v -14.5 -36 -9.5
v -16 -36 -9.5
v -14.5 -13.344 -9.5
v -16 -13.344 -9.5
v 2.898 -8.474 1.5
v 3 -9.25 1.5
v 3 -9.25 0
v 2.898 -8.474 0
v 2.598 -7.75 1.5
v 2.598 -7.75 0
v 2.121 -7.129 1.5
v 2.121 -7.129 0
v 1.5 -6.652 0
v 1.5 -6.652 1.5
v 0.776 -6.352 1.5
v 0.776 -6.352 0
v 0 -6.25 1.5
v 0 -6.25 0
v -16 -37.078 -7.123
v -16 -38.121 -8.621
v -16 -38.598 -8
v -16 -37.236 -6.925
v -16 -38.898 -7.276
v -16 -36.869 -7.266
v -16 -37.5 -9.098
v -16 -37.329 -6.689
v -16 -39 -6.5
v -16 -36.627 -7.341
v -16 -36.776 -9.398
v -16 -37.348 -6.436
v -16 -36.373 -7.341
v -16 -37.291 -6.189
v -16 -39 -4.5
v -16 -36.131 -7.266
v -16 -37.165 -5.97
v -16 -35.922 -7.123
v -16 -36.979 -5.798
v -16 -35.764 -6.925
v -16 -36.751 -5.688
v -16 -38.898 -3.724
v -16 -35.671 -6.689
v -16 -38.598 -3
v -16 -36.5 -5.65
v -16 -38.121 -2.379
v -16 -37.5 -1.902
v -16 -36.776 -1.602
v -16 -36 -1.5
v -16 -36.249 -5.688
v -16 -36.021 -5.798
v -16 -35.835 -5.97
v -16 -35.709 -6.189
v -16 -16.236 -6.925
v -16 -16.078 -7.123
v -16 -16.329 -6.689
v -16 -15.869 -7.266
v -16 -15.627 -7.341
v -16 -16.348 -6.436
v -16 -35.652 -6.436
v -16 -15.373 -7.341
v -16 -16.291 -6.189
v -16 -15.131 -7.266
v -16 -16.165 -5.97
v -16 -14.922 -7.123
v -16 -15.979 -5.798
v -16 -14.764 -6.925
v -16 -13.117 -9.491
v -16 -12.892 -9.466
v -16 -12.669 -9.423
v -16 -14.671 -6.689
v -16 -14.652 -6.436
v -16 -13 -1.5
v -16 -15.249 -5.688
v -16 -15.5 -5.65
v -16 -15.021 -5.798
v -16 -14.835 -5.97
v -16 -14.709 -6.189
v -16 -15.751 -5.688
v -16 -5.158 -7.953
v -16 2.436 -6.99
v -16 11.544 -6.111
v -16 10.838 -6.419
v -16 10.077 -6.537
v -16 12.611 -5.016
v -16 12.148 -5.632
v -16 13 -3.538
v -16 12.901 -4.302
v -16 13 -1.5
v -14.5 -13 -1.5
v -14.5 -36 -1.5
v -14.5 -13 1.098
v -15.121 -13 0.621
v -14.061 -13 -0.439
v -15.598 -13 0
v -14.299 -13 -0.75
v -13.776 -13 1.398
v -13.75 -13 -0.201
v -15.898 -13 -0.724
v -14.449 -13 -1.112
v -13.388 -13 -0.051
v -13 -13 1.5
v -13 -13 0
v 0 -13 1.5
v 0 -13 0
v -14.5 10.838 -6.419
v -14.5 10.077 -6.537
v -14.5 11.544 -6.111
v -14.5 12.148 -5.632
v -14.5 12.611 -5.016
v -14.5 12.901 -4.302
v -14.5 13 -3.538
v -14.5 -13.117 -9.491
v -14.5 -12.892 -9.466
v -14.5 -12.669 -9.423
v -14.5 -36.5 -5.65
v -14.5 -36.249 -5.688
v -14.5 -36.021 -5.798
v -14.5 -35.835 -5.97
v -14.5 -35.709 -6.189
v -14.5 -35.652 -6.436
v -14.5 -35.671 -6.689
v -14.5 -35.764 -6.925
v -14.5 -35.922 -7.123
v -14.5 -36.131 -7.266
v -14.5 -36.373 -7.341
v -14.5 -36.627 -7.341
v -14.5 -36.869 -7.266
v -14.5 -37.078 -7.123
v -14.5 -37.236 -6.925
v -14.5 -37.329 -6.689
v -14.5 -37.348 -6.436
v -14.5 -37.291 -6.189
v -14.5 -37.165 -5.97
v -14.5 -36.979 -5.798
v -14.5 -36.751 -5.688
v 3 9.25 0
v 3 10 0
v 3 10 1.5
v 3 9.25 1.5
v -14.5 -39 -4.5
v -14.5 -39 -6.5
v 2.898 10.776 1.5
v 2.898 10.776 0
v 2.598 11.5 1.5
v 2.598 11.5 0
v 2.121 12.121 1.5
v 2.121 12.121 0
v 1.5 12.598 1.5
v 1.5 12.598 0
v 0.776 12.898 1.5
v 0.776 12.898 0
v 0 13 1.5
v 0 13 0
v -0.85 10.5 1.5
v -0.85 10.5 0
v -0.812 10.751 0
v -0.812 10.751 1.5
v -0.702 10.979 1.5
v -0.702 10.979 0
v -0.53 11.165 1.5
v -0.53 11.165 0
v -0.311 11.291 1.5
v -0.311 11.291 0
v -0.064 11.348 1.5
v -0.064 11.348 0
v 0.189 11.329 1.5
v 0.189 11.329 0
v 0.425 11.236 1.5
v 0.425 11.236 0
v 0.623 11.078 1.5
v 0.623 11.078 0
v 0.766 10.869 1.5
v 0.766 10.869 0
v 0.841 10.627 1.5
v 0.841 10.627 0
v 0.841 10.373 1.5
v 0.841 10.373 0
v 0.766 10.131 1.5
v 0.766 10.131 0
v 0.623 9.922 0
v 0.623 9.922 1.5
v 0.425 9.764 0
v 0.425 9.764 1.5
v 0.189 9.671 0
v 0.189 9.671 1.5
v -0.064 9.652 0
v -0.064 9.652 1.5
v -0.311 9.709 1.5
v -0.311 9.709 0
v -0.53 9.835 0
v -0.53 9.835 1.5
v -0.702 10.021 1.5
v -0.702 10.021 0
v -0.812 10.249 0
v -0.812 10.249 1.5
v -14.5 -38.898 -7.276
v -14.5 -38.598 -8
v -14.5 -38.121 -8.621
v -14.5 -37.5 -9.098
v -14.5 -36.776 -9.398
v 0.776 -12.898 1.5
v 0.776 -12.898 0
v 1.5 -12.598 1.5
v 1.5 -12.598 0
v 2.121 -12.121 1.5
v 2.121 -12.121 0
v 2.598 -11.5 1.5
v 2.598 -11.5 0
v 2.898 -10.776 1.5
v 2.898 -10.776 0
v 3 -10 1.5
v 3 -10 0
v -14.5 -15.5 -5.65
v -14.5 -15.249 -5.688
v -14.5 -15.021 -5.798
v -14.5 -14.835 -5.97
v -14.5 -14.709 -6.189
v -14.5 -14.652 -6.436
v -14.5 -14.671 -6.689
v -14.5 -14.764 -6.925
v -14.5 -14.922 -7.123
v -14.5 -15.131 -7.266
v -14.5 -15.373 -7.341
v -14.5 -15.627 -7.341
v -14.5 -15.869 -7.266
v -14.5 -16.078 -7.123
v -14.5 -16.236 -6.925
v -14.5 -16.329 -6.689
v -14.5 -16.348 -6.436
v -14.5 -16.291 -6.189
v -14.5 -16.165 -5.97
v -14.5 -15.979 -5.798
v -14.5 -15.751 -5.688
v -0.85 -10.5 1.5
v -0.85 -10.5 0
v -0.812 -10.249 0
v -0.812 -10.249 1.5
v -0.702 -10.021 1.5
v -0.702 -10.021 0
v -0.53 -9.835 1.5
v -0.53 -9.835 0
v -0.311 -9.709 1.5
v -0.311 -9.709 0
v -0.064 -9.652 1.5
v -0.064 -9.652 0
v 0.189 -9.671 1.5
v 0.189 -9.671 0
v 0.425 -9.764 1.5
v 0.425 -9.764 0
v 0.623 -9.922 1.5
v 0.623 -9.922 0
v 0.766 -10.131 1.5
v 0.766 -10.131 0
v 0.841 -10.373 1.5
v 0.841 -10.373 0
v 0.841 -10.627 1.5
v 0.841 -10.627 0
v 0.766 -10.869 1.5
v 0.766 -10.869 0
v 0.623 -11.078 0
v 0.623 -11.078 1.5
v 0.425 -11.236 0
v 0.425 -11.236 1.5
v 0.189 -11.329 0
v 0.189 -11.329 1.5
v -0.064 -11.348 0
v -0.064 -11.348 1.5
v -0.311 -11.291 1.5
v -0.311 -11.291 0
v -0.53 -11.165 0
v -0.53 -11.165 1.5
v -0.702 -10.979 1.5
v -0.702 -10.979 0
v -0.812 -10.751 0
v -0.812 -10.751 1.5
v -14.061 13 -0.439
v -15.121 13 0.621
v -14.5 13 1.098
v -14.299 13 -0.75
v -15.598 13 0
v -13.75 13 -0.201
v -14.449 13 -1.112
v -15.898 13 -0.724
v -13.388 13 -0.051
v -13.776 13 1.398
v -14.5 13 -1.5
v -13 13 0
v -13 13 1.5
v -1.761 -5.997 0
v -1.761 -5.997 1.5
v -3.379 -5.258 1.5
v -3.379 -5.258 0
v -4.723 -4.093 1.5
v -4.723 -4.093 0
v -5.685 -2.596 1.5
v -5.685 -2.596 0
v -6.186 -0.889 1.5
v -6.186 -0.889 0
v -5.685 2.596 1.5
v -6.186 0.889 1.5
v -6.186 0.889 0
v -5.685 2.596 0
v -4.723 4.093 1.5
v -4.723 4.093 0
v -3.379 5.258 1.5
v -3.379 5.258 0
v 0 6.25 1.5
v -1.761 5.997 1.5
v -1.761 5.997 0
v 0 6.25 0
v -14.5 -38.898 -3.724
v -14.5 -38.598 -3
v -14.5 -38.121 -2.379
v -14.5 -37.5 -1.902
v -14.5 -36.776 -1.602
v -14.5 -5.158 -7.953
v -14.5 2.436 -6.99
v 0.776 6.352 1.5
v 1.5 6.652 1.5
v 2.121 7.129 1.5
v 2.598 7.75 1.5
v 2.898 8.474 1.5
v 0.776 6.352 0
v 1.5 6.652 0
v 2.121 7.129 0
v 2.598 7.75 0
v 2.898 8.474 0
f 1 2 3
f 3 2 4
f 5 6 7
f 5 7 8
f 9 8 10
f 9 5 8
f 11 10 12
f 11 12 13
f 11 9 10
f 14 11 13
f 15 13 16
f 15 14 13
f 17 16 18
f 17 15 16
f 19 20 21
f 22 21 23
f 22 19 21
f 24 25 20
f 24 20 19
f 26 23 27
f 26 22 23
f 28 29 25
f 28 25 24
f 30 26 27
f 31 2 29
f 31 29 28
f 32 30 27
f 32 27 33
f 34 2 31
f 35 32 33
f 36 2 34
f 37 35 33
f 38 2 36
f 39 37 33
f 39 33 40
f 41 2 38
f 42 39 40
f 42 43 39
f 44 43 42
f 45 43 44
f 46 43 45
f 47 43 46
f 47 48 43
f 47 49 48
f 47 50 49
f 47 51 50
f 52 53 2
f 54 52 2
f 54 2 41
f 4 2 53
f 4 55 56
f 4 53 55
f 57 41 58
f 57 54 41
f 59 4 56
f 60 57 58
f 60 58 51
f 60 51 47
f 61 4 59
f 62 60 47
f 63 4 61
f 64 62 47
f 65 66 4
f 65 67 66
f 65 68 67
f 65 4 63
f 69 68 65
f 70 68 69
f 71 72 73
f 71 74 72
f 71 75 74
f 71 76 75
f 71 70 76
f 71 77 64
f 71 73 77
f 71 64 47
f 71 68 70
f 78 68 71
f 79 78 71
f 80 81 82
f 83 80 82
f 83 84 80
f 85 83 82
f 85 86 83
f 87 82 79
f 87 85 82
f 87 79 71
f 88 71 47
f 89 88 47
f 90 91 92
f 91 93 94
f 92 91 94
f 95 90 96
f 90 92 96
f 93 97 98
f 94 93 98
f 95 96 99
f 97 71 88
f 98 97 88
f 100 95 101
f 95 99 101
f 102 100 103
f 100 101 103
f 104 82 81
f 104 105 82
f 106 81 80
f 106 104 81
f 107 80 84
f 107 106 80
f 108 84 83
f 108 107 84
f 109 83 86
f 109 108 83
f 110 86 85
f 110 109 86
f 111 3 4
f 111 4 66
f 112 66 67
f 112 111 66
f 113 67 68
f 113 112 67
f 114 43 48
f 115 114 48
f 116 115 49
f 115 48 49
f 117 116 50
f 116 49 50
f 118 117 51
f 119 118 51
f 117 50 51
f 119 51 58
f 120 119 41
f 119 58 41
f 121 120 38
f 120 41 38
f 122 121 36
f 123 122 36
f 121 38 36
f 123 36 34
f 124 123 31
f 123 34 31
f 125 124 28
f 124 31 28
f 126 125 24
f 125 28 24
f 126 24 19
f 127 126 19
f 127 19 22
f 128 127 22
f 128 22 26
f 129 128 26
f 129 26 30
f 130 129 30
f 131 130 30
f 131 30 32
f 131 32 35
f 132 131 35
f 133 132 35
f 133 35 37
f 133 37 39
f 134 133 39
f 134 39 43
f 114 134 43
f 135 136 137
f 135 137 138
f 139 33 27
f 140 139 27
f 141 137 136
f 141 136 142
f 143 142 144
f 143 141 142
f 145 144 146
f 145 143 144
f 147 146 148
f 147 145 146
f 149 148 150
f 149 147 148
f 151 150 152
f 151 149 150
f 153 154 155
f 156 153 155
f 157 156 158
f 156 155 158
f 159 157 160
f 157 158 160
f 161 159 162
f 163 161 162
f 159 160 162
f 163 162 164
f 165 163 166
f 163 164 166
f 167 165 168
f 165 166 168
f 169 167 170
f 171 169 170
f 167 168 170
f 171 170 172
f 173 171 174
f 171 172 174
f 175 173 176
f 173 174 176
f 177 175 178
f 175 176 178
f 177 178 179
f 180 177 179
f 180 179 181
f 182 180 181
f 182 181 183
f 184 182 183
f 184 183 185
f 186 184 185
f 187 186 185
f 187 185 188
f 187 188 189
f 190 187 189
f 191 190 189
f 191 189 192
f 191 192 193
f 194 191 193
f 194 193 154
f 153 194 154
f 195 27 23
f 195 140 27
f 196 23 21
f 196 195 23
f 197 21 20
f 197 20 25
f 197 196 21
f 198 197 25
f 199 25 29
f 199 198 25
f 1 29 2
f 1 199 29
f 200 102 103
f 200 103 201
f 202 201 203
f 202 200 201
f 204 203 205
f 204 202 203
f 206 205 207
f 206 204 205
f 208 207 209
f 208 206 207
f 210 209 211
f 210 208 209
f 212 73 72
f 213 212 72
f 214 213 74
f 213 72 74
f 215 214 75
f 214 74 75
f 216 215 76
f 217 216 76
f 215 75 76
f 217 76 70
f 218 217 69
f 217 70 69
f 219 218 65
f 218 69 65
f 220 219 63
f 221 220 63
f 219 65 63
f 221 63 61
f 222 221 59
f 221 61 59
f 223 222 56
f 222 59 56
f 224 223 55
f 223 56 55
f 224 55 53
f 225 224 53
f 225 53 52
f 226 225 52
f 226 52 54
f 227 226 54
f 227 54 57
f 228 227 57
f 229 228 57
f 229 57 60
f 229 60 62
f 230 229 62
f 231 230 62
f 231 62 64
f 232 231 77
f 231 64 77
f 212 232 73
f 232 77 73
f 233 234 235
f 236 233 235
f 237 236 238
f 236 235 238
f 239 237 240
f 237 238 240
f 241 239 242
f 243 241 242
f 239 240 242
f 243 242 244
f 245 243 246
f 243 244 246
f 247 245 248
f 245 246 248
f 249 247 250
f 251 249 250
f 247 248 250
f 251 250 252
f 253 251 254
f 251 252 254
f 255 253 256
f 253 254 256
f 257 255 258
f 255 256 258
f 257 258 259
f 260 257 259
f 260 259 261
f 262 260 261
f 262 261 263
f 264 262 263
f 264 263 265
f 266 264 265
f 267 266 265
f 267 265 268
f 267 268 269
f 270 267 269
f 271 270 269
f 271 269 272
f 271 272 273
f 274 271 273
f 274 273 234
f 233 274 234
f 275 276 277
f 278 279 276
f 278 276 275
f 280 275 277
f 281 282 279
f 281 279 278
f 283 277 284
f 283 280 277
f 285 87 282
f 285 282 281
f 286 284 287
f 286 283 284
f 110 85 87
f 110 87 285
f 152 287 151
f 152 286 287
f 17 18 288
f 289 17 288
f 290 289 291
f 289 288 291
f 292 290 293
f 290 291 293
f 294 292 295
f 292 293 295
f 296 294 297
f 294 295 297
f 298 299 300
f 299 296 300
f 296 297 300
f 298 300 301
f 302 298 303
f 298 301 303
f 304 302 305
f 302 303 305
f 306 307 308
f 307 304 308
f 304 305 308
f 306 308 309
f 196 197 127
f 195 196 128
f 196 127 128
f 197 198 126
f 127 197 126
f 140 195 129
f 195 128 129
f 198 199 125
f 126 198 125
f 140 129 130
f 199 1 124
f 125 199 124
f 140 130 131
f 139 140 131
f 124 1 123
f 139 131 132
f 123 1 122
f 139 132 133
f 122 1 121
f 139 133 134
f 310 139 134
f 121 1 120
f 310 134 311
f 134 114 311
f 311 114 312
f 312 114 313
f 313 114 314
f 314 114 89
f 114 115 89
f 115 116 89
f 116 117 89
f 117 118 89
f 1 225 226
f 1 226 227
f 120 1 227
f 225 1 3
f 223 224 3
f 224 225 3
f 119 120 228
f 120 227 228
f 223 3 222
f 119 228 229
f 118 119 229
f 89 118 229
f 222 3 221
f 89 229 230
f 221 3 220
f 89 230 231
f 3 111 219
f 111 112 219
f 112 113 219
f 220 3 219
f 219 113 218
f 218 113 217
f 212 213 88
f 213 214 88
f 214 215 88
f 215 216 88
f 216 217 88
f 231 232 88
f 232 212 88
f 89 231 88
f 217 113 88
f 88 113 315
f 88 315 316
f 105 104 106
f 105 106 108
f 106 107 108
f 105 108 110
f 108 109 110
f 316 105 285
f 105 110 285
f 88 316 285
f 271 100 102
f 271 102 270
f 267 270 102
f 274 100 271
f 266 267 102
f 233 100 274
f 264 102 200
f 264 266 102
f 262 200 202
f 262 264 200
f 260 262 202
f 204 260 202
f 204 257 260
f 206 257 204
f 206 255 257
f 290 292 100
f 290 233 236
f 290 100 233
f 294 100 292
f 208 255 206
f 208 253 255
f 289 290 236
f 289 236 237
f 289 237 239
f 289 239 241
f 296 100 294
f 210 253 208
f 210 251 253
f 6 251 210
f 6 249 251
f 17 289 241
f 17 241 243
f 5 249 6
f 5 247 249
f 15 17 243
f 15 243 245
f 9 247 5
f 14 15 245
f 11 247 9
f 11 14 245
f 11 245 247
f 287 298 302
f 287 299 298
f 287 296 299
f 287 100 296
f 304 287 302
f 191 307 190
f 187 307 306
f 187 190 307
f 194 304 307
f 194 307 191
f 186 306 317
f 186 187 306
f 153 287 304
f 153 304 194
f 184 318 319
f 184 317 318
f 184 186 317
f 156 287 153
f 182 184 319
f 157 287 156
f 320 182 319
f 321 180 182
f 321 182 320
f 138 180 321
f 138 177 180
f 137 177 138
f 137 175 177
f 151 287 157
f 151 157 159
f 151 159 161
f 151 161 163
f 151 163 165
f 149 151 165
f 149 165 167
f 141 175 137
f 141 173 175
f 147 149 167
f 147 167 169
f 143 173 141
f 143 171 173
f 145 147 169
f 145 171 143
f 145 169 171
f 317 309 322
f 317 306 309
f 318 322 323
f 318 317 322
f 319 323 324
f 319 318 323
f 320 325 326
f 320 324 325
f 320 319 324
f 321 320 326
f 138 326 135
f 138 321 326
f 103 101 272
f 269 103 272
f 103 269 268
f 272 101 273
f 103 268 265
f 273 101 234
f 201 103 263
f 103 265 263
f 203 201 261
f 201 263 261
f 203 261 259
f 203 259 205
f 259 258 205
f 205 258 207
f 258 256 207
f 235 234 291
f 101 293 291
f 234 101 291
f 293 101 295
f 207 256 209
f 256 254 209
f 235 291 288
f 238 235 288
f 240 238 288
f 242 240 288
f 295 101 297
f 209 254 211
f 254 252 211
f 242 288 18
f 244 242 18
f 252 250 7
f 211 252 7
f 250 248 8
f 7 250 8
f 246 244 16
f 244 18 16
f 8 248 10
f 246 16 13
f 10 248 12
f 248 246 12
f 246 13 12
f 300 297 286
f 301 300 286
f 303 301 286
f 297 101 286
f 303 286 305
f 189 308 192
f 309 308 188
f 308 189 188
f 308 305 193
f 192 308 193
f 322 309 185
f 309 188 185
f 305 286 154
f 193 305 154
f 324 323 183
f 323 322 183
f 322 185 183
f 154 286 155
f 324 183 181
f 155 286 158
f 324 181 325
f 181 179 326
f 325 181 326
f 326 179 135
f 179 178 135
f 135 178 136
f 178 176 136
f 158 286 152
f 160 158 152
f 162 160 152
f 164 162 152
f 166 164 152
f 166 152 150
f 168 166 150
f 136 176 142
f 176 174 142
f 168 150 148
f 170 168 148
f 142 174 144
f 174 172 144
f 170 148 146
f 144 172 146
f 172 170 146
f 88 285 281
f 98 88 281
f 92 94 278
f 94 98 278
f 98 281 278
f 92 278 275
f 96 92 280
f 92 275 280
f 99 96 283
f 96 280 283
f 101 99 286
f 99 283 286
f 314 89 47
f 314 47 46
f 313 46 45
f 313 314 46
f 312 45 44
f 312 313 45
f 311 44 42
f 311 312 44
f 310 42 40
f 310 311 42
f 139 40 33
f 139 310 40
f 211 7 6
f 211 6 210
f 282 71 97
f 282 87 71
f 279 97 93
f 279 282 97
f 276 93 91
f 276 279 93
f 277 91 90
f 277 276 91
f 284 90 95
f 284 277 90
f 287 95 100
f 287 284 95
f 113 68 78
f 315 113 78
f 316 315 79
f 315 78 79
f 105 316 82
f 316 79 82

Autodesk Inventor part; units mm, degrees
ref_plane "YZ Plane" through (0, 0, 0) normal (1, 0, 0) x (0, 1, 0)
ref_plane "XZ Plane" through (0, 0, 0) normal (0, 1, 0) x (-1, 0, 0)
ref_plane "XY Plane" through (0, 0, 0) normal (0, 0, 1) x (1, 0, 0)
sketch "スケッチ1" plane through (0, 0, 0) normal (0, 0, 1) x (1, 0, 0)
  circle A0 centre (0, 0) radius 6.25
  line L0 (0, 13) -> (-16, 13)
  line L1 (-16, 13) -> (-16, -13)
  line L2 (-16, -13) -> (0, -13)
  line L3 (0, -13) -> (0, 13)
  line L4 (0, 13) -> (3, 13)
  line L5 (3, 13) -> (3, -13)
  line L6 (3, -13) -> (0, -13)
  line L7 (0, -13) -> (0, 13)
  point P0 (-16, 0)
  point P1 (3, -5.4829)
  point P2 (3, 5.4829)
  dimension "d0" = 12.5
  dimension "d1" = 16
  dimension "d2" = 26
  dimension "d3" = 3
extrude "プレート1" add sketch "スケッチ1" along normal blind 1.5 contours A0 L3 L4 L5 | L5 L6 L3 A0 | A0 L3 L2 L1 L0
sketch "スケッチ2" plane through (-14.5, 13, 1.5) normal (-1, 0, 0) x (0, -1, 0)
  line L0 (26, 0) -> (0, 0)
  line L1 (0, 0) -> (0, -11)
  line L2 (0, -11) -> (26, -11)
  line L3 (26, -11) -> (26, 0)
edge flange "フランジ1" height 11 angle 90 thickness 1.5 bend radius 1.5 thickness toward (-1, 0, 0) relief tear relief width 1.5 relief depth 0.75 edges at (-16, 0, 0) wall of the first edge with corners at (-14.5, -13, 1.5) (-14.5, 13, 1.5) (-14.5, 13, -9.5) (-14.5, -13, -9.5)
bend "曲げ1"
corner "コーナー1"
sketch "スケッチ3" plane through (-16, -13, -9.5) normal (-1, 0, 0) x (0, 0, 1)
  line L0 (8, 0) -> (0, 0) projected
  line L1 (0, 0) -> (8, 0)
  line L2 (8, 0) -> (8, -26)
  line L3 (8, -26) -> (0, -26)
  line L4 (0, -26) -> (0, 0)
  line L5 (8, 0) -> (8, 26) projected
  arc A0 (0, 0) -> (3, 26) centre (-111.1667, 26) ccw
  line L6 (3, 20) -> (3, 26) construction
  line L7 (0, 26) -> (8, 26) projected
  line L8 (0, 0) -> (0, 26) projected
  point P0 (9.5, 13)
  point P1 (8, 0)
  dimension "d15" = 26
  dimension "d21" = 5
sheet face with bend "面2" sketch "スケッチ3" thickness 1.5 toward (1, 0, 0) bend radius 1.5 contours L2 L3 L4 L0
bend "曲げ2"
extrude "切り取り1" cut sketch "スケッチ3" against normal blind 1.5 contours L8 L7 A0
sketch "スケッチ5" plane through (0, 0, 0) normal (0, 0, -1) x (-1, 0, 0)
  circle A0 centre (0, 10.5) radius 0.85 projected
  circle A1 centre (0, -10.5) radius 0.85 projected
  point P0 (0, 0)
extrude "切り取り2" cut sketch "スケッチ5" against normal blind 1.5
sketch "スケッチ6" plane through (-16, -39, -1.5) normal (-1, 0, 0) x (0, 0, 1)
  circle A0 centre (-5, 23.5) radius 0.85 projected
  circle A1 centre (-5, 2.5) radius 0.85 projected
  point P0 (1.5, 39)
extrude "切り取り3" cut sketch "スケッチ6" against normal blind 1.5
fillet "フィレット1" radius 3 8 edges at (3, 13, 0.75) (3, 5.4829, 0.75) (3, -5.4829, 0.75) (3, -13, 0.75) (-15.25, -13, -9.5) (-15.25, 13, -6.5) (-15.25, -39, -9.5) (-15.25, -39, -1.5)
equation "\"d23\" = Thickness"
equation "\"d25\" = Thickness"
equation "\"d27\" = Thickness"
equation "\"d4\" = Thickness"
equation "\"d5\" = BendReliefWidth"
equation "\"d6\" = BendReliefDepth"
equation "\"d7\" = MinimumRemnant"
equation "\"d8\" = TransitionRadius"
equation "\"d11\" = BendRadius"
equation "\"d12\" = CornerReliefSize"
equation "\"d13\" = GapSize"
equation "\"d14\" = JacobiRadiusSize"
equation "\"d16\" = BendRadius"
equation "\"d17\" = BendReliefWidth"
equation "\"d19\" = MinimumRemnant"
equation "\"d18\" = BendReliefDepth"
equation "\"d20\" = TransitionRadius"
equation "\"BendRadius\" = Thickness"
equation "\"BendReliefWidth\" = Thickness"
equation "\"BendReliefDepth\" = 0.5 * Thickness"
equation "\"CornerReliefSize\" = 4 * Thickness"
equation "\"MinimumRemnant\" = 2 * Thickness"
equation "\"TransitionRadius\" = BendRadius"
equation "\"JacobiRadiusSize\" = BendRadius"
equation "\"GapSize\" = Thickness"
equation "\"Thickness\" = 1.5"
properties part number "hipjoint_toleg_under_right"
